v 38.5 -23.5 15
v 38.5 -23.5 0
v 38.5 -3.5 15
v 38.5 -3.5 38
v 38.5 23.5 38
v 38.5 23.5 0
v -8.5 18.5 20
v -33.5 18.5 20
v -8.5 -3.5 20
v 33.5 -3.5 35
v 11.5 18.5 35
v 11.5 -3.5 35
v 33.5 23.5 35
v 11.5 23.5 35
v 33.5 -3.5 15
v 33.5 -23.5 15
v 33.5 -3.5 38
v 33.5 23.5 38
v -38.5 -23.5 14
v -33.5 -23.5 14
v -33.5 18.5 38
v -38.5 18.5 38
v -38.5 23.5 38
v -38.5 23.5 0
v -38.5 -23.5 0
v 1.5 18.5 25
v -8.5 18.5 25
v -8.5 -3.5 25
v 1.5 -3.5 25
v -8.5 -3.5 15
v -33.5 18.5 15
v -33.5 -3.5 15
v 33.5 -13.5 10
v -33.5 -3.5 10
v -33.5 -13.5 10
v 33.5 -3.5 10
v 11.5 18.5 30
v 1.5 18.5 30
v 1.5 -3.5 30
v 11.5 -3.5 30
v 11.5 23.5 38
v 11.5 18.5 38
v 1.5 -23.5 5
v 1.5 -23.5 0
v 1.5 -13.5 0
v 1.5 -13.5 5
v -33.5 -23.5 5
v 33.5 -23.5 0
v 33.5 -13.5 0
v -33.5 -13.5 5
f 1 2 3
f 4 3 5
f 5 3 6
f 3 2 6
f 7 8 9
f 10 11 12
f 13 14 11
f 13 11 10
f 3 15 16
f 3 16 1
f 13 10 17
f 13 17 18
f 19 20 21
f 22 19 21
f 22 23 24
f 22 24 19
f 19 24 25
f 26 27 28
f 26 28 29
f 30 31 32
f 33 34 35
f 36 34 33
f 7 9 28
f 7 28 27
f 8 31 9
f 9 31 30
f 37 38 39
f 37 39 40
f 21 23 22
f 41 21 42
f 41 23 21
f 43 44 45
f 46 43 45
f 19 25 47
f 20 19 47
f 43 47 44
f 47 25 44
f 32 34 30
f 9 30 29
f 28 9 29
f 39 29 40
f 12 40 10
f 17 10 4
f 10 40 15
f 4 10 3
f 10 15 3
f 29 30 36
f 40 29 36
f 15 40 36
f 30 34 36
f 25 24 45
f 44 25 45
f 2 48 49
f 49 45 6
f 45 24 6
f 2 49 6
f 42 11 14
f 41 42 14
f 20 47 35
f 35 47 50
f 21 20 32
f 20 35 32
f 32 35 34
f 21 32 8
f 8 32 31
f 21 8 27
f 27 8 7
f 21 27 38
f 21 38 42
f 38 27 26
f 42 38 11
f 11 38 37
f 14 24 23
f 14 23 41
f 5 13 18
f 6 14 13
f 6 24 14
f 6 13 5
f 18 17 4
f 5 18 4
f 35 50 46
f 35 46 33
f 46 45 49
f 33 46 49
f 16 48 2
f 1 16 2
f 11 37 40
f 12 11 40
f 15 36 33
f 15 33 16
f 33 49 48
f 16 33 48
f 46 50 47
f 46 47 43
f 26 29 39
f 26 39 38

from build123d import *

# Parameters (mm, degrees)
F0_W      = 35
F0_H      = 10
F1_DEPTH  = 5
F2_DEPTH  = 10
F3_DEPTH  = 15
F4_DEPTH  = 38
F5_DEPTH  = 38
F7_DEPTH  = 5
F8_DEPTH  = 15
F0_W_2    = 10
F0_H_2    = 22
F9_DEPTH  = 25
F10_DEPTH = 30
F11_DEPTH = 35
F12_DEPTH = 20
F0_W_3    = 5
F0_H_3    = 27
F13_DEPTH = 38


with BuildPart() as f1:
    # F0 (on Top) → F1 (new body)
    with BuildSketch(Plane.XY):
        with Locations((-16, -18.5)):
            Rectangle(F0_W, F0_H)
    extrude(amount=F1_DEPTH)

    # F0 (on Top) → F2 (join)
    with BuildSketch(Plane.XY):
        Polygon((33.5, -13.5), (33.5, -3.5), (11.5, -3.5), (1.5, -3.5), (-8.5, -3.5), (-33.5, -3.5), (-33.5, -13.5), (1.5, -13.5), align=None)
    extrude(amount=F2_DEPTH)

    # F0 (on Top) → F3 (join)
    with BuildSketch(Plane.XY):
        Polygon((38.5, -3.5), (33.5, -3.5), (33.5, -13.5), (33.5, -23.5), (38.5, -23.5), align=None)
    extrude(amount=F3_DEPTH)



with BuildPart() as f4:
    # F0 (on Top) → F4 (new body)
    with BuildSketch(Plane.XY):
        Polygon((11.5, 23.5), (-38.5, 23.5), (-38.5, 18.5), (-33.5, 18.5), (-8.5, 18.5), (1.5, 18.5), (11.5, 18.5), align=None)
    extrude(amount=F4_DEPTH)


with BuildPart() as f1_1:
    add(f1.part)

    add(f4.part)  # F5 merges F4
    # F0 (on Top) → F5 (join)
    with BuildSketch(Plane.XY):
        Polygon((-33.5, 18.5), (-38.5, 18.5), (-38.5, -23.5), (-33.5, -23.5), (-33.5, -13.5), (-33.5, -3.5), align=None)
    extrude(amount=F5_DEPTH)

    # F6 (on face) → F7 (cut)
    with BuildSketch(Plane.YZ.offset(-33.5)):
        Polygon((-23.5, 14), (18.5, 38), (-23.5, 38), align=None)
    extrude(amount=-F7_DEPTH, mode=Mode.SUBTRACT)

    # F0 (on Top) → F8 (join)
    with BuildSketch(Plane.XY):
        Polygon((-8.5, -3.5), (-33.5, 18.5), (-33.5, -3.5), align=None)
    extrude(amount=F8_DEPTH)

    # F0 (on Top) → F9 (join)
    with BuildSketch(Plane.XY):
        with Locations((-3.5, 7.5)):
            Rectangle(F0_W_2, F0_H_2)
    extrude(amount=F9_DEPTH)

    # F0 (on Top) → F10 (join)
    with BuildSketch(Plane.XY):
        with Locations((6.5, 7.5)):
            Rectangle(F0_W_2, F0_H_2)
    extrude(amount=F10_DEPTH)

    # F0 (on Top) → F11 (join)
    with BuildSketch(Plane.XY):
        Polygon((33.5, 23.5), (11.5, 23.5), (11.5, 18.5), (11.5, -3.5), (33.5, -3.5), align=None)
    extrude(amount=F11_DEPTH)

    # F0 (on Top) → F12 (join)
    with BuildSketch(Plane.XY):
        Polygon((-8.5, 18.5), (-33.5, 18.5), (-8.5, -3.5), align=None)
    extrude(amount=F12_DEPTH)

    # F0 (on Top) → F13 (join)
    with BuildSketch(Plane.XY):
        with Locations((36, 10)):
            Rectangle(F0_W_3, F0_H_3)
    extrude(amount=F13_DEPTH)


solid = f1_1.part
